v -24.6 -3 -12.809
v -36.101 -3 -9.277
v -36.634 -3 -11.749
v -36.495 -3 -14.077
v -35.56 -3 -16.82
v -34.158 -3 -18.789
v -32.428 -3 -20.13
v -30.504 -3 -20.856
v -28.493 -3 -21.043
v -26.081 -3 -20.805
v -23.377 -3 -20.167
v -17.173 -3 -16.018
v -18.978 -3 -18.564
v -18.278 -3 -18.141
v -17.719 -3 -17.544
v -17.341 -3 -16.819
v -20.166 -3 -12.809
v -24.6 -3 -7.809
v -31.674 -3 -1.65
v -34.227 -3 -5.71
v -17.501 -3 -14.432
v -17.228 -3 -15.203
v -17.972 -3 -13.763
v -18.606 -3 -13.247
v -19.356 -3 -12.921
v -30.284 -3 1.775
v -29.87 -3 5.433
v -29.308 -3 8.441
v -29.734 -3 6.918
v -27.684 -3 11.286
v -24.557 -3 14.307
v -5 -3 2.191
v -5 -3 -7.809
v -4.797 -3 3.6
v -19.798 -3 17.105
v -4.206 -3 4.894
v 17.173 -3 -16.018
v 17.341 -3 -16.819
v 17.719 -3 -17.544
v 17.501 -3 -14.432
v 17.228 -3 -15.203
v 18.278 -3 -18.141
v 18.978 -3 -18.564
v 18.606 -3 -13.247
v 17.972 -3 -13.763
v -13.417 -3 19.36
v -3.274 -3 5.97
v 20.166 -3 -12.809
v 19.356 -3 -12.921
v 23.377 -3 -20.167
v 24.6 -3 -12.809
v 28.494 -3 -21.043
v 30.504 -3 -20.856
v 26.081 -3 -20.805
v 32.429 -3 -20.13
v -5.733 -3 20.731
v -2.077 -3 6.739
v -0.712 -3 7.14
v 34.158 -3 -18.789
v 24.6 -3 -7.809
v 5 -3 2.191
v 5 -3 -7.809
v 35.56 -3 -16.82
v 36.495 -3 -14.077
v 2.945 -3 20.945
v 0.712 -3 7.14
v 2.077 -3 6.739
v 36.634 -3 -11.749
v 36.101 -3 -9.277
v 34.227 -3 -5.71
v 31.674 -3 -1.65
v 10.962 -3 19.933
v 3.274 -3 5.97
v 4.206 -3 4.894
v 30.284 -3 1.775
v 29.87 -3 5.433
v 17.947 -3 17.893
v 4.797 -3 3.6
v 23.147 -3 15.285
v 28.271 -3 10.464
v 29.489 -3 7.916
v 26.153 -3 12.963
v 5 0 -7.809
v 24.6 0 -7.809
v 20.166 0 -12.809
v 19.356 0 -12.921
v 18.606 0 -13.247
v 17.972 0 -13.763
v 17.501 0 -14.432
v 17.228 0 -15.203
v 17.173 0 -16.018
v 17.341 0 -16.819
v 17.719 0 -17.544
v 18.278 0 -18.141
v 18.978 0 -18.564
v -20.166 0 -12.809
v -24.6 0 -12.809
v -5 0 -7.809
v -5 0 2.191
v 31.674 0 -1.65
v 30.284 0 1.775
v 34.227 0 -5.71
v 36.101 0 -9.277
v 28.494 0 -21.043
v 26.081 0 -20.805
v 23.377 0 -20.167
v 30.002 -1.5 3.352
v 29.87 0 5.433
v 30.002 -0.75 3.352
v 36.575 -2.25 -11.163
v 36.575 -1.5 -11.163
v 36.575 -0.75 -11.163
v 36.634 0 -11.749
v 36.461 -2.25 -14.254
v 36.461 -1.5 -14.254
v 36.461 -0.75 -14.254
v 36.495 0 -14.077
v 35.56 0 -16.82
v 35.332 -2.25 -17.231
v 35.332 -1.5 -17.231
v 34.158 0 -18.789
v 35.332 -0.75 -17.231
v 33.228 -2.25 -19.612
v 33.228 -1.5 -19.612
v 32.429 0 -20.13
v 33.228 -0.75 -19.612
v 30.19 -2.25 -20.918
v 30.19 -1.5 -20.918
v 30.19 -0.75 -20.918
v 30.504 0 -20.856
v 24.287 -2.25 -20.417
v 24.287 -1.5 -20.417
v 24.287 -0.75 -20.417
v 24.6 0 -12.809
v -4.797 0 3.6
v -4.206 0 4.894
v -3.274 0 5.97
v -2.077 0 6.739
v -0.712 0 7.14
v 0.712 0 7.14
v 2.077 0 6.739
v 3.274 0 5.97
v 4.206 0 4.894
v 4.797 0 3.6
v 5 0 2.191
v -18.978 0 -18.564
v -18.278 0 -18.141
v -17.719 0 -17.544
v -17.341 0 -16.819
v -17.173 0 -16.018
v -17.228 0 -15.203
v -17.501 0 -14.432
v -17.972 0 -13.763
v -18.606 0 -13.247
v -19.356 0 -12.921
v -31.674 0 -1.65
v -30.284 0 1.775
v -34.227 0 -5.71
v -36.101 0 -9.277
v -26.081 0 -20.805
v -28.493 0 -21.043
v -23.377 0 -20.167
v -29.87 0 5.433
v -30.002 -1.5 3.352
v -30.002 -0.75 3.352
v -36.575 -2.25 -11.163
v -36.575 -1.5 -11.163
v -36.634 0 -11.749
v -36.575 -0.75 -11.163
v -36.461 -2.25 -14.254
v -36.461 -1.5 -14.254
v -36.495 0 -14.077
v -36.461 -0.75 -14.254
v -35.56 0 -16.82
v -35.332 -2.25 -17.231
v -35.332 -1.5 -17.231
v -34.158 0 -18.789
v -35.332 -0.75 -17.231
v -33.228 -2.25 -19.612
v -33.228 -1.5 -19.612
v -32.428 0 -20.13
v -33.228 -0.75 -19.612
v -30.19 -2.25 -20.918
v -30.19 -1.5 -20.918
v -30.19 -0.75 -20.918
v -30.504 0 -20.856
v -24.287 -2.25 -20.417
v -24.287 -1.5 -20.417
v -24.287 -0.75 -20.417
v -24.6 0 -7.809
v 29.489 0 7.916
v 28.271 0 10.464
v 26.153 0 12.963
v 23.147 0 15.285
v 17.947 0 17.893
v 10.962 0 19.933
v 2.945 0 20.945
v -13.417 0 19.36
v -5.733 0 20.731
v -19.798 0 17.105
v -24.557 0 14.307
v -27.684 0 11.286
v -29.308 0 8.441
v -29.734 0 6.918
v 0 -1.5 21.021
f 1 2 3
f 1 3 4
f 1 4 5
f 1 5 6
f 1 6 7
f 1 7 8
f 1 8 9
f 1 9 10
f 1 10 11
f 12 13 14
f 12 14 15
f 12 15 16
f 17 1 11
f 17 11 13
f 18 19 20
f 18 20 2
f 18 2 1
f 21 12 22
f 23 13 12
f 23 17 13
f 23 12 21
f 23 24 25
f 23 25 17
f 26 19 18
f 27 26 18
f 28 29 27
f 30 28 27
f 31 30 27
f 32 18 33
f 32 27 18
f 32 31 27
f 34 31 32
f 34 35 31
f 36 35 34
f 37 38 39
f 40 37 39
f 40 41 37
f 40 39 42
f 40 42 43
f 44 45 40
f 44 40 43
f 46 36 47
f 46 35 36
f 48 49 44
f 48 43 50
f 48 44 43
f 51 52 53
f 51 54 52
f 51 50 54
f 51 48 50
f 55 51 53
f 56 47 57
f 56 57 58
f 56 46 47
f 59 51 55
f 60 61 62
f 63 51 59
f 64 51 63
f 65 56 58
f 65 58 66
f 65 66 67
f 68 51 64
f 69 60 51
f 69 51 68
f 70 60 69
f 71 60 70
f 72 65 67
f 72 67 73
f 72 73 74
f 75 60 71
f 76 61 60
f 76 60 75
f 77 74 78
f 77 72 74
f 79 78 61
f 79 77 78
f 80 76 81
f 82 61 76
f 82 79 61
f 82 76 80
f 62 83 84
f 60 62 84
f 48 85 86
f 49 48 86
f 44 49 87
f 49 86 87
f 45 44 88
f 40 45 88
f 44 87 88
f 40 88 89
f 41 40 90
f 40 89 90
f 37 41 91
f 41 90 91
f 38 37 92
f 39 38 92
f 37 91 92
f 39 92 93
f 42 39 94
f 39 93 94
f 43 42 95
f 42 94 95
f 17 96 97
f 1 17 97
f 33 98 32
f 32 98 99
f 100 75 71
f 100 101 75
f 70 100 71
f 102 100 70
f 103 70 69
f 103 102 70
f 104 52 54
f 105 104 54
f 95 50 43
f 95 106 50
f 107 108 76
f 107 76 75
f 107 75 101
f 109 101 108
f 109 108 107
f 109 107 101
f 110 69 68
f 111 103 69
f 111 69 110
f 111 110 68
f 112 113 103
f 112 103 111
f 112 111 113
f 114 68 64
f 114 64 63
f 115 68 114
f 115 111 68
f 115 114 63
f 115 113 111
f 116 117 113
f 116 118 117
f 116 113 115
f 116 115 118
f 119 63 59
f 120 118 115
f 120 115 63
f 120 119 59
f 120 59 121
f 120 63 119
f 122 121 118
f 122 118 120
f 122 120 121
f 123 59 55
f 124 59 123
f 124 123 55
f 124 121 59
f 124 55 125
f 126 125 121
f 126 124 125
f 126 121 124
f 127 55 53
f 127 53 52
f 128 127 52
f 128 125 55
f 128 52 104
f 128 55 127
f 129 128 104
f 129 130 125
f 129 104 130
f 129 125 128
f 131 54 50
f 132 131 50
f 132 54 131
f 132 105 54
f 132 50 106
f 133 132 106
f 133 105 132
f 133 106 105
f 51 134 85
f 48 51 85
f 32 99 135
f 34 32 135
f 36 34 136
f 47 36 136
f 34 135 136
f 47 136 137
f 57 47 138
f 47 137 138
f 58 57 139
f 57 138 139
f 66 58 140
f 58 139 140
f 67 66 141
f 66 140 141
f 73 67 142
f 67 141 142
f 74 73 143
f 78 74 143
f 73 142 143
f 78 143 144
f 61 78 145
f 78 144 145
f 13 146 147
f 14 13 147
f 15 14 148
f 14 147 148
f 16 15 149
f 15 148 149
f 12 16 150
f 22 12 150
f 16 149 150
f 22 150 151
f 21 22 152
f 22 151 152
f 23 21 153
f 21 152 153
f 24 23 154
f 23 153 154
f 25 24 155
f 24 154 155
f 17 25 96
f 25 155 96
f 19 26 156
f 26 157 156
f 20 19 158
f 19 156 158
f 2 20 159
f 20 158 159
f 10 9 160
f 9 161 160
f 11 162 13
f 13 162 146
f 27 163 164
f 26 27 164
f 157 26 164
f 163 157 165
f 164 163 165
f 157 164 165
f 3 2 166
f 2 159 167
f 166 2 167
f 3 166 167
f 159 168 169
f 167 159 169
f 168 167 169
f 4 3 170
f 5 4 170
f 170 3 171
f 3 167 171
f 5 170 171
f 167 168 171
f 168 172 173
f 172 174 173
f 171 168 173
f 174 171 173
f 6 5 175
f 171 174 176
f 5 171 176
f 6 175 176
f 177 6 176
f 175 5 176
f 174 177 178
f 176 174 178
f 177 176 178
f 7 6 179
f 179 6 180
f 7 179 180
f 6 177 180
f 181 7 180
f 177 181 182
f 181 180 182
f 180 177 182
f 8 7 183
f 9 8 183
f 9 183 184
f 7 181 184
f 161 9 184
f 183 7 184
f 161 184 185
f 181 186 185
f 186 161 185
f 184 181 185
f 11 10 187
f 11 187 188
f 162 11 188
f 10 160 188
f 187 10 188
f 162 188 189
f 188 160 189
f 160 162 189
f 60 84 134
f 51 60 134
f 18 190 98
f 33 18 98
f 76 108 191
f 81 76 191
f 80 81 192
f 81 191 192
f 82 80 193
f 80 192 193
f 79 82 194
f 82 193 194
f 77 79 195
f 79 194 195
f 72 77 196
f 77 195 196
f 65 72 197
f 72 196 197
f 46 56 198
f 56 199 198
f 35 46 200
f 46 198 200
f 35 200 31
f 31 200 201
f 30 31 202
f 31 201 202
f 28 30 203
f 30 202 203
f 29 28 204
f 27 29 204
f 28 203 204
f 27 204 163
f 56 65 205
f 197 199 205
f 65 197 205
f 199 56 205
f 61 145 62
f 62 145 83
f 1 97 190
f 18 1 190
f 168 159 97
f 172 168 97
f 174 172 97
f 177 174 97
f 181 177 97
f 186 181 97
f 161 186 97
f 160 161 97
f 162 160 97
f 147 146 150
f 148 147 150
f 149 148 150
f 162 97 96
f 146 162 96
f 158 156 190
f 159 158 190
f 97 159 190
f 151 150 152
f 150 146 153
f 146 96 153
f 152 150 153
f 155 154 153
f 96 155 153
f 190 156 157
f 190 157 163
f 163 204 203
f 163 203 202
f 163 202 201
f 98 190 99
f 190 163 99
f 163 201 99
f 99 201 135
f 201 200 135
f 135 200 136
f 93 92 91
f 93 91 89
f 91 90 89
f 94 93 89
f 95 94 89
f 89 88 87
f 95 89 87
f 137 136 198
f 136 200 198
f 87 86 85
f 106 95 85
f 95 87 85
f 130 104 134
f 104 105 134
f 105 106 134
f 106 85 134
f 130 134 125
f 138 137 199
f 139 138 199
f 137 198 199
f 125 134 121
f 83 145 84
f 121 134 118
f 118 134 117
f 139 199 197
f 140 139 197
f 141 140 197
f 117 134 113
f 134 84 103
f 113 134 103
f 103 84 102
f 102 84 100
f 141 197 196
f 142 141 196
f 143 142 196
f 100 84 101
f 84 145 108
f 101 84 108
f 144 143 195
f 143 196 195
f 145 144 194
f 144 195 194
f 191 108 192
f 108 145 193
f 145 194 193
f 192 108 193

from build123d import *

# Parameters (mm, degrees)
F1_DEPTH = 3


# Not quite as in the source:
# - ends of sketch curves that miss each other by under 0.0002 mm in the source are joined
# - the dataset's text gives a spline's control points without its knots; the knots are read off the source's solid


with BuildPart() as f1:
    # F0 (on Front) → F1 (new body)
    with BuildSketch(Plane.XZ):
        with BuildLine():
            Line((-20.166137, -12.809077), (-24.6, -12.809077))
            Line((-24.6, -12.809077), (-24.6, -7.809077))
            Line((-24.6, -7.809077), (-5, -7.809077))
            Line((-5, -7.809077), (-5, 2.190923))
            ThreePointArc((-5, 2.190923), (0, 7.190923), (5, 2.190923))
            Line((5, 2.190923), (5, -7.809077))
            Line((5, -7.809077), (24.6, -7.809077))
            Line((24.6, -7.809077), (24.6, -12.809077))
            Line((24.6, -12.809077), (20.166138, -12.809077))
            ThreePointArc((20.166138, -12.809077), (17.2280963794, -15.2025199657), (18.9780781253, -18.5638027094))
            add(Edge.make_bspline(
                [(29.869969, 5.432538), (29.917769, 4.949314), (29.942006, -2.148841), (40.01044, -8.831034), (33.118633, -23.880184), (21.728451, -19.749985), (18.9780781253, -18.5638027094)],
                knots=[26.688985, 26.688985, 26.688985, 26.688985, 28.557776, 42.872008, 54.1154, 62.665306, 62.665306, 62.665306, 62.665306], degree=3))
            add(Edge.make_bspline(
                [(29.869969, 5.432538), (29.869969, 21.0209257), (-5.1736e-06, 21.020923), (-29.8699793473, 21.0209203), (-29.869969, 5.4325326)],
                knots=[0, 0, 0, 1.5707965, 1.5707965, 3.141593, 3.141593, 3.141593], degree=2, weights=[1, 0.7071067199, 1, 0.7071067199, 1]))
            add(Edge.make_bspline(
                [(-29.869969, 5.4325326), (-29.917769, 4.949314), (-29.942006, -2.148841), (-40.01044, -8.831034), (-33.118633, -23.880184), (-21.72845, -19.749985), (-18.978078, -18.563803)],
                knots=[26.688985, 26.688985, 26.688985, 26.688985, 28.557776, 42.872008, 54.1154, 62.665306, 62.665306, 62.665306, 62.665306], degree=3))
            ThreePointArc((-18.978078, -18.563803), (-17.2280952866, -15.2025204153), (-20.166137, -12.809077))
        make_face()
    extrude(amount=F1_DEPTH)


solid = f1.part
